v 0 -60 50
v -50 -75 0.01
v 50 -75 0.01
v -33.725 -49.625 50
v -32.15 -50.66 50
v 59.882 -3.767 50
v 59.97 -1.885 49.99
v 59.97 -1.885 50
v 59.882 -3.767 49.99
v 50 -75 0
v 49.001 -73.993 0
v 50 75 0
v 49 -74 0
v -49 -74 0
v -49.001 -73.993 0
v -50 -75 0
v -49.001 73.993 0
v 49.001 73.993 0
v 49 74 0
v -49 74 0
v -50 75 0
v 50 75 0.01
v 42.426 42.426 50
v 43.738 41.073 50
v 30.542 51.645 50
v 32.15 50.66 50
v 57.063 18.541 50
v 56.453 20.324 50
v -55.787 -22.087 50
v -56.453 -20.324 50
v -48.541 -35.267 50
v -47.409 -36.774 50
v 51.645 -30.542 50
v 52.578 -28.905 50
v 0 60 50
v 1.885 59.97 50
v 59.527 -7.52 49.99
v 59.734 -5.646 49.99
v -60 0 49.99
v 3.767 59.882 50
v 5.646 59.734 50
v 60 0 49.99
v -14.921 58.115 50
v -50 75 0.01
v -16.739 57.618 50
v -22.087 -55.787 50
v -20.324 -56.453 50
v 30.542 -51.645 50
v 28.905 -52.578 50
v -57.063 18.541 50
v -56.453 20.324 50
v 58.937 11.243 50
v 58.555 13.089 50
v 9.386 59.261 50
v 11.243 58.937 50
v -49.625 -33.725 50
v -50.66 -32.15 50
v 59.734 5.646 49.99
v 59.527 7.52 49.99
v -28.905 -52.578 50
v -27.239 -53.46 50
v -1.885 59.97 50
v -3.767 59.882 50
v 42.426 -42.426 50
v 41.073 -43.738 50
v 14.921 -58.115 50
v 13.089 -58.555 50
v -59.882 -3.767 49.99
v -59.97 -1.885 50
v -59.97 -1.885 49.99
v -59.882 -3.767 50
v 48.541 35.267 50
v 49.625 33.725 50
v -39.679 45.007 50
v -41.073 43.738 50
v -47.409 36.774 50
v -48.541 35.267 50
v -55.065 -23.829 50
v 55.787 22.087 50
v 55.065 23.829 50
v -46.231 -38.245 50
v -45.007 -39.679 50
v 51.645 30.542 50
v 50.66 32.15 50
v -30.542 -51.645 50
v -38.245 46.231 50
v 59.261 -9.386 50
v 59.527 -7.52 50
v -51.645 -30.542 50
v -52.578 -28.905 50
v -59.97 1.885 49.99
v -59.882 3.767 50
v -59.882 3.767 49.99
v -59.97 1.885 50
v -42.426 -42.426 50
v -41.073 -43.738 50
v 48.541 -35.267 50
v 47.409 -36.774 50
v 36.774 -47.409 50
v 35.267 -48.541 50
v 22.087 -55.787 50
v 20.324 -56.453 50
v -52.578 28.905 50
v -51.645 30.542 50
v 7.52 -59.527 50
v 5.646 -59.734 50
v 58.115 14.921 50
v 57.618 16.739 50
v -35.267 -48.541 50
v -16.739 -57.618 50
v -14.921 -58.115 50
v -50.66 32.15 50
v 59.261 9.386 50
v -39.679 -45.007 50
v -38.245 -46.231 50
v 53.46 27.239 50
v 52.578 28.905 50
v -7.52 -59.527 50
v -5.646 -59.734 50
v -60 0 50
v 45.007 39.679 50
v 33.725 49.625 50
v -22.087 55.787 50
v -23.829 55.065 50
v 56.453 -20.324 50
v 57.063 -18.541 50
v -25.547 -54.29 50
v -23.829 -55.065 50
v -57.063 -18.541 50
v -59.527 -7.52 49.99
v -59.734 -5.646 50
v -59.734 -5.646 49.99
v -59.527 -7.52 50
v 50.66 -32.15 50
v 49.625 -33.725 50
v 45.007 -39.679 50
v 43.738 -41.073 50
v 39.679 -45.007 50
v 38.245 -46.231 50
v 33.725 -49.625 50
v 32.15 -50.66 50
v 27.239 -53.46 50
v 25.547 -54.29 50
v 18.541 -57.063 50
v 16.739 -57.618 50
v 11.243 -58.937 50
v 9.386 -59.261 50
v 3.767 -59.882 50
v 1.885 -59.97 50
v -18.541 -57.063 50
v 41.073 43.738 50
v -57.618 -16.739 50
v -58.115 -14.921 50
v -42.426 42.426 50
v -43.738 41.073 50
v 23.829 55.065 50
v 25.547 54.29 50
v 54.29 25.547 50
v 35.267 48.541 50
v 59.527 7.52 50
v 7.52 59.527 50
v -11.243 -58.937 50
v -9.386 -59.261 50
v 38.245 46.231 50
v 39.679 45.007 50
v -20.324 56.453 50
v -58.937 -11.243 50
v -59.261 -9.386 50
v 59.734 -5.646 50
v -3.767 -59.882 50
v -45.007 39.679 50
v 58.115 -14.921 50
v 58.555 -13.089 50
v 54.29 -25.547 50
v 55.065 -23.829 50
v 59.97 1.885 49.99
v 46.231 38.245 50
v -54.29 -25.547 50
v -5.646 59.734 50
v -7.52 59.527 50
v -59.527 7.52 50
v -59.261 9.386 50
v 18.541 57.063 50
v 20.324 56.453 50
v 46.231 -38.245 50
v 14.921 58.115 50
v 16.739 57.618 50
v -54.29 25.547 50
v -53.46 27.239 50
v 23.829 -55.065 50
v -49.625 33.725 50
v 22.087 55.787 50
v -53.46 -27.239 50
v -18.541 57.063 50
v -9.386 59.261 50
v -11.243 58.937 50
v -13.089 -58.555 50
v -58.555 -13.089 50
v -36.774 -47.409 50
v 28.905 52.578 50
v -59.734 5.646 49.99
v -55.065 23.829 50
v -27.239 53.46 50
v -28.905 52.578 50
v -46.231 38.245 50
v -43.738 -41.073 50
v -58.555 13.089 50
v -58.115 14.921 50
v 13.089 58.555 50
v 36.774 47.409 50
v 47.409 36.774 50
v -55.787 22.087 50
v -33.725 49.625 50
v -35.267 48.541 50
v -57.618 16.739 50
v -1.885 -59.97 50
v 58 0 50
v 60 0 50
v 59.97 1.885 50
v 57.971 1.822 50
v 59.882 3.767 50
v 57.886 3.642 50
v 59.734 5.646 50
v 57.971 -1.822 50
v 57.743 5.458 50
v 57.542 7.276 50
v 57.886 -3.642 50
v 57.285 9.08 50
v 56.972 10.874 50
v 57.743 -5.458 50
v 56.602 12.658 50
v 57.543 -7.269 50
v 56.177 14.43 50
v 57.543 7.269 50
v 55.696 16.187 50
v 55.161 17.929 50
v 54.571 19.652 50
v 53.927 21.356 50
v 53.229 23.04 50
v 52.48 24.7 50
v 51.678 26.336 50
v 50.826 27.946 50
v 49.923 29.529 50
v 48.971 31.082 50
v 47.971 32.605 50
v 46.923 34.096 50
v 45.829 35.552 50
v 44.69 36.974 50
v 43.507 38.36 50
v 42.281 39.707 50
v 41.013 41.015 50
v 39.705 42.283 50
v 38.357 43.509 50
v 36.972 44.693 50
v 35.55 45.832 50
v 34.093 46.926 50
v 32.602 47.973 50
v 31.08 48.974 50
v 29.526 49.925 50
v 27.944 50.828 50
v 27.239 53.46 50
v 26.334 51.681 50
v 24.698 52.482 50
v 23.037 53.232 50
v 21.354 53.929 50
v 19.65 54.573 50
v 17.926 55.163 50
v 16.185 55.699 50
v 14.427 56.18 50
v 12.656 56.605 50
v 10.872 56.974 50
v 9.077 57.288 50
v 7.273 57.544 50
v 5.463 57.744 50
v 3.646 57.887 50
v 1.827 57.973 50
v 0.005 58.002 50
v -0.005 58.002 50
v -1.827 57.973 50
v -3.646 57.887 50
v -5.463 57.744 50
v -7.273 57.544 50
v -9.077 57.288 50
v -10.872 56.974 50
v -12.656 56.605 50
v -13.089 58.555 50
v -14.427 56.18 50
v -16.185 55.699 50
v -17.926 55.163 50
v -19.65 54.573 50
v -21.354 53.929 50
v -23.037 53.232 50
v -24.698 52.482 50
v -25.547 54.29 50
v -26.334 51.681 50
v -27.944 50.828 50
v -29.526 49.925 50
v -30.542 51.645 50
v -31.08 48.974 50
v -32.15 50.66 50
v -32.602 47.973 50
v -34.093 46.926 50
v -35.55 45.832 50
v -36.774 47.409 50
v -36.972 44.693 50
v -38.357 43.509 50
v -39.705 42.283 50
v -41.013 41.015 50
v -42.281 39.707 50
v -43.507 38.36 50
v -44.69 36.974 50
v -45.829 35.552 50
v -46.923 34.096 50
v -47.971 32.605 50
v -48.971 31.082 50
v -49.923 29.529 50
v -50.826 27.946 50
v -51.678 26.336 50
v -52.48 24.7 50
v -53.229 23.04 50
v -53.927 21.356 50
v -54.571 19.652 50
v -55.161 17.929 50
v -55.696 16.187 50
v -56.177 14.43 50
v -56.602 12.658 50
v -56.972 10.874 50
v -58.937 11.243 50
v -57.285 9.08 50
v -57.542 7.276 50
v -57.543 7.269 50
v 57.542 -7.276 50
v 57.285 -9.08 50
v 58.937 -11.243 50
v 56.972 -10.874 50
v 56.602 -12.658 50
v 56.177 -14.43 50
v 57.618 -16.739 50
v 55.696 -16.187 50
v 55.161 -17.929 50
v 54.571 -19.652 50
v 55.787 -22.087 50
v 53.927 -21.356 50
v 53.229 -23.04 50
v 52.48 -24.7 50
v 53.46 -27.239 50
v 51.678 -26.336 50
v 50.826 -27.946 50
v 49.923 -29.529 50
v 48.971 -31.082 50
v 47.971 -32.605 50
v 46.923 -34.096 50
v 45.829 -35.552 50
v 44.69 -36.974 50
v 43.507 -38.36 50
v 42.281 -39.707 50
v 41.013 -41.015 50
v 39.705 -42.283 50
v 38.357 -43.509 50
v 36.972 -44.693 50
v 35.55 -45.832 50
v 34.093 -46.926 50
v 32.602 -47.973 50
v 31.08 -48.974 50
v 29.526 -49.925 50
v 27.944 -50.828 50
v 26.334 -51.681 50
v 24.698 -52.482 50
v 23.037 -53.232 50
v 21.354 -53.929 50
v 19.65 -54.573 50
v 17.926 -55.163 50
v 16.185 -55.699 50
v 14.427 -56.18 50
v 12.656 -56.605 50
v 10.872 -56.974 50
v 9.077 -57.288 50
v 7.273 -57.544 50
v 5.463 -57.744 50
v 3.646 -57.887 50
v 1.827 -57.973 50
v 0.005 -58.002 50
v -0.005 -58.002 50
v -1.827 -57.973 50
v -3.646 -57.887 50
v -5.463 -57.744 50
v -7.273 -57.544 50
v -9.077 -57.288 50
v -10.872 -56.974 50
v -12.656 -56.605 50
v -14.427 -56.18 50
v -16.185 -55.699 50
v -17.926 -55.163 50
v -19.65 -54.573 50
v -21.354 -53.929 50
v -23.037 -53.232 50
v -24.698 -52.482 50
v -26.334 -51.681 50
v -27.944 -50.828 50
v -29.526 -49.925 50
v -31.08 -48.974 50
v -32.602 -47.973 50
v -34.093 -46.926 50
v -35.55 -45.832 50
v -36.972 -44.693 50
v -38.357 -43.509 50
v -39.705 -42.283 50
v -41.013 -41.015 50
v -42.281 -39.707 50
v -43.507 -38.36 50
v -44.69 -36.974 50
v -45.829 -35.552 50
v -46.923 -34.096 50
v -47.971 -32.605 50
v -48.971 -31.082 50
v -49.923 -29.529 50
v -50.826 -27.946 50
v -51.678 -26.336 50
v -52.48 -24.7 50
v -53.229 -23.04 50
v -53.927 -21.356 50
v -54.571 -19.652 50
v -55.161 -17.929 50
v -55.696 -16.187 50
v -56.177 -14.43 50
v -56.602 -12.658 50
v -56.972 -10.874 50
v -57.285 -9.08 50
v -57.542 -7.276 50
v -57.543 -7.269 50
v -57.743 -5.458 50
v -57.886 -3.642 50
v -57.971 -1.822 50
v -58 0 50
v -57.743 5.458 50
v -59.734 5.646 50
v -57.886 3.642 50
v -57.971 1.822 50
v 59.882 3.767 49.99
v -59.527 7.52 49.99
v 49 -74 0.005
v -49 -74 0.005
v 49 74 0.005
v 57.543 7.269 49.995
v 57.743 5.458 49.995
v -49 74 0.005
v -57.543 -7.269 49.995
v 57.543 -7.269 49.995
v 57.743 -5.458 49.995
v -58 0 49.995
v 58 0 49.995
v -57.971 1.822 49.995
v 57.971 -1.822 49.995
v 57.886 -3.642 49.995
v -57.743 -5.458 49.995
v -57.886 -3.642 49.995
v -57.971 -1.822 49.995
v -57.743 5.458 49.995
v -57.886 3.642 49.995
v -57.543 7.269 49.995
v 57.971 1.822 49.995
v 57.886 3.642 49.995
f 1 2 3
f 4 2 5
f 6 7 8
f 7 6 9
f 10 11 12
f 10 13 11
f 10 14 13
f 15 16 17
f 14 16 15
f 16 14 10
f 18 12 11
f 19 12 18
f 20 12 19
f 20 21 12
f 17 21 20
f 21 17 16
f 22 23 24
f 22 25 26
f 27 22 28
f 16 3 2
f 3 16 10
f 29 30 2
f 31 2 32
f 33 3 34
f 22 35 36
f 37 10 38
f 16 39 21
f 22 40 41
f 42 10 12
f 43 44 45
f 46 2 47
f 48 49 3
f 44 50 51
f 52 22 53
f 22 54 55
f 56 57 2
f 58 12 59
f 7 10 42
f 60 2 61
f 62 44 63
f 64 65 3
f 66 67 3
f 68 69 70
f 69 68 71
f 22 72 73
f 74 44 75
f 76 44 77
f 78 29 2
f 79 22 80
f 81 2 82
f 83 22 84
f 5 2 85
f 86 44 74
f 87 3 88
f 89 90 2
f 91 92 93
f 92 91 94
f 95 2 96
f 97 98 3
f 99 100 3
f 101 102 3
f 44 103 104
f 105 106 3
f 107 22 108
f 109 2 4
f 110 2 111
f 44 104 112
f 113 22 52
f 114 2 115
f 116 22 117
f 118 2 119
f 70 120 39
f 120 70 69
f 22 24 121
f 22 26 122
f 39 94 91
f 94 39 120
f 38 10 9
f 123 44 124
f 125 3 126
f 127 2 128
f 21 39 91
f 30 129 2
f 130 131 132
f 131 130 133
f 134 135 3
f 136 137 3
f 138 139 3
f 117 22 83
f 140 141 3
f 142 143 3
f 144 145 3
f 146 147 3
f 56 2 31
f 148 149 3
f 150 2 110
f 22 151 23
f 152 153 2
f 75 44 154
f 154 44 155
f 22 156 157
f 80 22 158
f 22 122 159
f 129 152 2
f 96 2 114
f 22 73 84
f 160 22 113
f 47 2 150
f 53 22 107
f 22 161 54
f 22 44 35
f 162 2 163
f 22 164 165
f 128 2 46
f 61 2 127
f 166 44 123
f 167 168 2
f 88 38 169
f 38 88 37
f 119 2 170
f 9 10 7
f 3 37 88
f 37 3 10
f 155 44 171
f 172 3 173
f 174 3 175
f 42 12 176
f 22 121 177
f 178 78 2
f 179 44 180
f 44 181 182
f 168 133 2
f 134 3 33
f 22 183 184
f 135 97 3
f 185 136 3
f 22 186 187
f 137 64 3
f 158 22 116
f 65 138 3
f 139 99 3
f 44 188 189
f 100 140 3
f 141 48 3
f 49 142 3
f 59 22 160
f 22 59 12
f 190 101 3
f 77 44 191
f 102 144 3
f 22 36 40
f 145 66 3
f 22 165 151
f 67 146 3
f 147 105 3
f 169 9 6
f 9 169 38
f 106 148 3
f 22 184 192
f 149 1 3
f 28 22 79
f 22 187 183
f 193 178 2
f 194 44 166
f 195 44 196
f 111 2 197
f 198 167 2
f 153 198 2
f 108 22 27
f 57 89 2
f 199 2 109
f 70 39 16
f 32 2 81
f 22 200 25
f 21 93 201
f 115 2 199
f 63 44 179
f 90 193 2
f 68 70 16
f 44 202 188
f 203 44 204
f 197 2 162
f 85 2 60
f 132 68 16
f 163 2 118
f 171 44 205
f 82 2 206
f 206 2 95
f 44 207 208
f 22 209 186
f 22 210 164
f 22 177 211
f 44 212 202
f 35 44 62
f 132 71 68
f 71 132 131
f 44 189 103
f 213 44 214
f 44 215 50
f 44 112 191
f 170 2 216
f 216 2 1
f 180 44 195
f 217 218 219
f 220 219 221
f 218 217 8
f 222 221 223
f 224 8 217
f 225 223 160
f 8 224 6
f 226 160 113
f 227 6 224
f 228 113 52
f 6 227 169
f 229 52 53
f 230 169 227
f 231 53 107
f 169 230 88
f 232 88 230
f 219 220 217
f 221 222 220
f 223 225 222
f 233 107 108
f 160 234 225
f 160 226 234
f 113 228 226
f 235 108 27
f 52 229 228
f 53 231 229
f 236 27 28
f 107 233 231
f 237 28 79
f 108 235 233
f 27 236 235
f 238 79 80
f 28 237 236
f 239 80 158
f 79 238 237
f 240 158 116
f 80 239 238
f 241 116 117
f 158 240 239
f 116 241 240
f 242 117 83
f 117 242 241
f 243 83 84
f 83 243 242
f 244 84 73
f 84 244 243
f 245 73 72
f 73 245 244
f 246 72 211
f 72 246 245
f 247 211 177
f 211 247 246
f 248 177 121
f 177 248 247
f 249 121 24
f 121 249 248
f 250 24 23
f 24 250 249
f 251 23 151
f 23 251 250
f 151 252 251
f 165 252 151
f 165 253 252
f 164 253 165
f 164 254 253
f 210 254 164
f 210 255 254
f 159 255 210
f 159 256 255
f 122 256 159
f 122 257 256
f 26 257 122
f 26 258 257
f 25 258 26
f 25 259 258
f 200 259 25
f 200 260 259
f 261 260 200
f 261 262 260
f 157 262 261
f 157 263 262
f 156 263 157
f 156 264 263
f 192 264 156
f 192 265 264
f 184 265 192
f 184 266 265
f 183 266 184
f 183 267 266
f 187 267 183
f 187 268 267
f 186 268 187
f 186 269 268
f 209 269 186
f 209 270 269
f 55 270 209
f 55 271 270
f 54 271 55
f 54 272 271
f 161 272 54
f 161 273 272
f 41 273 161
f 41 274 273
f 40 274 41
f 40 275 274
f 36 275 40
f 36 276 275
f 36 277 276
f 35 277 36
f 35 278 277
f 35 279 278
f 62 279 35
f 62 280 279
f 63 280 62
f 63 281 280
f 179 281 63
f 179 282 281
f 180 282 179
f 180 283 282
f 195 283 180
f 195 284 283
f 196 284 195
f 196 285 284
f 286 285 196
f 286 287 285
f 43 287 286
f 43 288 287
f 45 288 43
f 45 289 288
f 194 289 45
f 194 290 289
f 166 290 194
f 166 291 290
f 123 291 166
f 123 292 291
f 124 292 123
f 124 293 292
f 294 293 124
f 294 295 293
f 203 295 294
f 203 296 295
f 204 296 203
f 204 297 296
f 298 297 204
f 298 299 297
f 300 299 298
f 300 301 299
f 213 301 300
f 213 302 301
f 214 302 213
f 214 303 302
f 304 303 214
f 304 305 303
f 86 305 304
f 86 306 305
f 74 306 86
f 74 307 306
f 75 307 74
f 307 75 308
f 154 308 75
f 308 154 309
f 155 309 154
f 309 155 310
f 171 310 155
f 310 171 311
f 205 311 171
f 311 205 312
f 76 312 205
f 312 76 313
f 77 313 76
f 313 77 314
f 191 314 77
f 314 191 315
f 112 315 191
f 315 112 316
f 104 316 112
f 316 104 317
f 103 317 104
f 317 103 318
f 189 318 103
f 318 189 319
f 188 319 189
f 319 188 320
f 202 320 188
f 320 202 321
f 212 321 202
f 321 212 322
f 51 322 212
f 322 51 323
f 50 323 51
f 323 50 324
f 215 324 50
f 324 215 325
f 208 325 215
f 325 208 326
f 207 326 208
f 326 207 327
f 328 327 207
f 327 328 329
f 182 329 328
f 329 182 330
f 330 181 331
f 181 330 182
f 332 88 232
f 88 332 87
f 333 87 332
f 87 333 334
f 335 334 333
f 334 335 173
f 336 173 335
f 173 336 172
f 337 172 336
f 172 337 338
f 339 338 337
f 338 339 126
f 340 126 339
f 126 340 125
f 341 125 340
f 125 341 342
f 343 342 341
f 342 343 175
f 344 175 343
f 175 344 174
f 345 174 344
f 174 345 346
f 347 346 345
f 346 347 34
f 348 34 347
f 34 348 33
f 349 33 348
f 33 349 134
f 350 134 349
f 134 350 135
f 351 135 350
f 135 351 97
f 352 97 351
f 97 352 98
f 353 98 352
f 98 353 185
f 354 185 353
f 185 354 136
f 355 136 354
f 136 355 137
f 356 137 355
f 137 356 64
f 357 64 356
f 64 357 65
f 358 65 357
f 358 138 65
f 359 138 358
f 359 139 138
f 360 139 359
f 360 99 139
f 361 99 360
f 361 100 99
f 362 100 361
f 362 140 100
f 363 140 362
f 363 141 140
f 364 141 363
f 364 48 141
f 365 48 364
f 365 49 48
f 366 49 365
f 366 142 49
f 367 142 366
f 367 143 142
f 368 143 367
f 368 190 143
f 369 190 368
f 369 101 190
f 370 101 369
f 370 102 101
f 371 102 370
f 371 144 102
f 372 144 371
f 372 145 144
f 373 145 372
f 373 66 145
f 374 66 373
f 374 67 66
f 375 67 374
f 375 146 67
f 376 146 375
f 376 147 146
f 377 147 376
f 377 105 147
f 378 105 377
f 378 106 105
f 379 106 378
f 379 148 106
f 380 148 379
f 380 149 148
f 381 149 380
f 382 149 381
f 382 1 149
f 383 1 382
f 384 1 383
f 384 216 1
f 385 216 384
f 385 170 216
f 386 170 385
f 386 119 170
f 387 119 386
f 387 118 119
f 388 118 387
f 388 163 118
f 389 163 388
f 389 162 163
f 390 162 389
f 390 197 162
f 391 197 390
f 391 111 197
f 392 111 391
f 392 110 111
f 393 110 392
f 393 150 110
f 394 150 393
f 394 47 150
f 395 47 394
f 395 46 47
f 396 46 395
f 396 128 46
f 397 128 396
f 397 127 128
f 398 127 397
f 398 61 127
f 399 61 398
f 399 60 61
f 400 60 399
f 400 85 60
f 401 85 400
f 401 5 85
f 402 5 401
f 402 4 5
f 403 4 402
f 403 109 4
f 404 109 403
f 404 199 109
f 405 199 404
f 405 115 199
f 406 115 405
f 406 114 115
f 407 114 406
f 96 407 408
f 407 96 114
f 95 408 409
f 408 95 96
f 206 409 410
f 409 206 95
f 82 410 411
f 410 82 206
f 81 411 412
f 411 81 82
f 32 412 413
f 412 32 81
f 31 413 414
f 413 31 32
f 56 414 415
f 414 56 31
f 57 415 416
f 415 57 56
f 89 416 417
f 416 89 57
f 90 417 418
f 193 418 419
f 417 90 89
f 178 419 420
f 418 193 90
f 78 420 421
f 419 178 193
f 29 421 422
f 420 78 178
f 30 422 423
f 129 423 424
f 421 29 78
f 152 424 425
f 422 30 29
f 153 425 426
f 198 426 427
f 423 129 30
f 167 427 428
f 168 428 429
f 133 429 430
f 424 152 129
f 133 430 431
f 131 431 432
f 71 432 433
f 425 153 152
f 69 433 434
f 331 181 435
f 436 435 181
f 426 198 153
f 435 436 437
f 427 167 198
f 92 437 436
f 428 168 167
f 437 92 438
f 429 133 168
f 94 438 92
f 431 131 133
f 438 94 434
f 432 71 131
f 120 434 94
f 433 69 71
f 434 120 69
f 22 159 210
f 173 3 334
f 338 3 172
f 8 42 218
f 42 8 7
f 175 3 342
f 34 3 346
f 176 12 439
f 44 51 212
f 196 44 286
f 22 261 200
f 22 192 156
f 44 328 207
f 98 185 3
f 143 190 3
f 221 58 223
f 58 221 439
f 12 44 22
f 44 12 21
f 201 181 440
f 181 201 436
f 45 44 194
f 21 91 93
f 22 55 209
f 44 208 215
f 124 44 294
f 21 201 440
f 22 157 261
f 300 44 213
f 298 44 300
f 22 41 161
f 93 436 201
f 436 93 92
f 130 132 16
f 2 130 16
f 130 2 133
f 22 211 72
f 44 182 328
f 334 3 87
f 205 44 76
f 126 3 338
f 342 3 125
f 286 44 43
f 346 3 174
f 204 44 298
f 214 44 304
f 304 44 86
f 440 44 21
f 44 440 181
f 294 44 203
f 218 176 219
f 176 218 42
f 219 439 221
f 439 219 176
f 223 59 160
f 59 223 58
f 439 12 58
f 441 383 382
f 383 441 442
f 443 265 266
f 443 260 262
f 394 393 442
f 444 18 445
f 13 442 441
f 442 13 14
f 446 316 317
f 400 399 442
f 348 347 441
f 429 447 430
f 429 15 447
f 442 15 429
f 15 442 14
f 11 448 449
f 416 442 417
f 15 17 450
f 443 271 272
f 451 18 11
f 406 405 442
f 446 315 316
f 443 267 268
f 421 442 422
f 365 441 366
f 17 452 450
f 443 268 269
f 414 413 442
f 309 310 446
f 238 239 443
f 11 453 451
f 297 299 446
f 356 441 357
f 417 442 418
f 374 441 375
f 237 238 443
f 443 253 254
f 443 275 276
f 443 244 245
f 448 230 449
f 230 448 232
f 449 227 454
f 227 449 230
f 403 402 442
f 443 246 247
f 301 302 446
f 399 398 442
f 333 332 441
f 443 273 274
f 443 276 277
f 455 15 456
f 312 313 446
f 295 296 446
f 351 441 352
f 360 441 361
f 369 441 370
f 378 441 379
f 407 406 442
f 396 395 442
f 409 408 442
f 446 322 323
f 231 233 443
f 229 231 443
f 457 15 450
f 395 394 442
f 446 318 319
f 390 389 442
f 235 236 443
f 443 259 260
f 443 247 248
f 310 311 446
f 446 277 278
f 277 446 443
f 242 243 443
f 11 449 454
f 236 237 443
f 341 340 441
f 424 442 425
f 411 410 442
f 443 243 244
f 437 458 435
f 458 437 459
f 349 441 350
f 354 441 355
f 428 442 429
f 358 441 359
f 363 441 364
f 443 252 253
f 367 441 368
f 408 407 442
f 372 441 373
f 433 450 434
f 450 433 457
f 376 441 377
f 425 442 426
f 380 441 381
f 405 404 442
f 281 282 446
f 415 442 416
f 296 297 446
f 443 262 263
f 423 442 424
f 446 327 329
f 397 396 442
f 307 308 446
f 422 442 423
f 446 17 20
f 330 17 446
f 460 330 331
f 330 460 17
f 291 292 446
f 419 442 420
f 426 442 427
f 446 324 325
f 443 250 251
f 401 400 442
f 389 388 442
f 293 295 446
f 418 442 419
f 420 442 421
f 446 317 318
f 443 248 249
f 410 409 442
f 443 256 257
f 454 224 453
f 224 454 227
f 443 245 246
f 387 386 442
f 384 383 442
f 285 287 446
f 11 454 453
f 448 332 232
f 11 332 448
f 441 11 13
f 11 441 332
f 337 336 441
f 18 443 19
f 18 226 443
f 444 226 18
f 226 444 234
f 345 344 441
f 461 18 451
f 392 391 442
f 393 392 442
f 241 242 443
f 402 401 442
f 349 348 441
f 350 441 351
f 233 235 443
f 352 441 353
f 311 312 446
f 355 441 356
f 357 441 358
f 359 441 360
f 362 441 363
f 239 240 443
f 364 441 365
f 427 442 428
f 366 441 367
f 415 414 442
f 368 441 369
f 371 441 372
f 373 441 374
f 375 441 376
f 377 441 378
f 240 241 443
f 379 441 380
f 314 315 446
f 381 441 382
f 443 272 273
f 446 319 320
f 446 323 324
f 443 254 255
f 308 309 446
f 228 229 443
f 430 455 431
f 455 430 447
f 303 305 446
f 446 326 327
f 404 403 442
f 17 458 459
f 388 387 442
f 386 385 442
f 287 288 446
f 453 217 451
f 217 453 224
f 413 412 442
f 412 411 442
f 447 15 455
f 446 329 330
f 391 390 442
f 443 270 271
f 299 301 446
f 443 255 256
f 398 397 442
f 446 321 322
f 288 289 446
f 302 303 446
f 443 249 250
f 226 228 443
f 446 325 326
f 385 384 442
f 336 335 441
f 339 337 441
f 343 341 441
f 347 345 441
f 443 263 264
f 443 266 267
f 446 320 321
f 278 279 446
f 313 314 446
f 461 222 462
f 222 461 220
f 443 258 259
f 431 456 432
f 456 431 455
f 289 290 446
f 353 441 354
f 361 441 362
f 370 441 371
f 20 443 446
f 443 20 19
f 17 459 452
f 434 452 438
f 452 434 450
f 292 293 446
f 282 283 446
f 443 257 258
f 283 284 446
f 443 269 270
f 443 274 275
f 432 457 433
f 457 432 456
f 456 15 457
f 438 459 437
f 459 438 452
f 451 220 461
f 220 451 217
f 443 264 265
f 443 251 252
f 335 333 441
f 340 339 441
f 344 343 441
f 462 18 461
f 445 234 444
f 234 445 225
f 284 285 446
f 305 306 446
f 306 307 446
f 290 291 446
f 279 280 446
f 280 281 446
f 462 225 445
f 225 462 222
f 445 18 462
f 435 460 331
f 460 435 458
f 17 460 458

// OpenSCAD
steps = 50;
width = 100;
depth = 150;
height = 50;
radius = 60;
thickness = 2;
eps = 0.01;
$fn = 200;
    
module cube_to_cylinder(width,depth,height,radius) {
    hull(){
        translate([-width/2,-depth/2,0])
        cube([width,depth,eps]);
        translate([0,0,height-eps])
        cylinder(h = eps, r = radius);
    }
}

difference() {
    cube_to_cylinder(width,depth,height,radius);
    translate([0,0,-eps/2])
    cube_to_cylinder(width-thickness,depth-thickness,height+eps,radius-thickness);
}
